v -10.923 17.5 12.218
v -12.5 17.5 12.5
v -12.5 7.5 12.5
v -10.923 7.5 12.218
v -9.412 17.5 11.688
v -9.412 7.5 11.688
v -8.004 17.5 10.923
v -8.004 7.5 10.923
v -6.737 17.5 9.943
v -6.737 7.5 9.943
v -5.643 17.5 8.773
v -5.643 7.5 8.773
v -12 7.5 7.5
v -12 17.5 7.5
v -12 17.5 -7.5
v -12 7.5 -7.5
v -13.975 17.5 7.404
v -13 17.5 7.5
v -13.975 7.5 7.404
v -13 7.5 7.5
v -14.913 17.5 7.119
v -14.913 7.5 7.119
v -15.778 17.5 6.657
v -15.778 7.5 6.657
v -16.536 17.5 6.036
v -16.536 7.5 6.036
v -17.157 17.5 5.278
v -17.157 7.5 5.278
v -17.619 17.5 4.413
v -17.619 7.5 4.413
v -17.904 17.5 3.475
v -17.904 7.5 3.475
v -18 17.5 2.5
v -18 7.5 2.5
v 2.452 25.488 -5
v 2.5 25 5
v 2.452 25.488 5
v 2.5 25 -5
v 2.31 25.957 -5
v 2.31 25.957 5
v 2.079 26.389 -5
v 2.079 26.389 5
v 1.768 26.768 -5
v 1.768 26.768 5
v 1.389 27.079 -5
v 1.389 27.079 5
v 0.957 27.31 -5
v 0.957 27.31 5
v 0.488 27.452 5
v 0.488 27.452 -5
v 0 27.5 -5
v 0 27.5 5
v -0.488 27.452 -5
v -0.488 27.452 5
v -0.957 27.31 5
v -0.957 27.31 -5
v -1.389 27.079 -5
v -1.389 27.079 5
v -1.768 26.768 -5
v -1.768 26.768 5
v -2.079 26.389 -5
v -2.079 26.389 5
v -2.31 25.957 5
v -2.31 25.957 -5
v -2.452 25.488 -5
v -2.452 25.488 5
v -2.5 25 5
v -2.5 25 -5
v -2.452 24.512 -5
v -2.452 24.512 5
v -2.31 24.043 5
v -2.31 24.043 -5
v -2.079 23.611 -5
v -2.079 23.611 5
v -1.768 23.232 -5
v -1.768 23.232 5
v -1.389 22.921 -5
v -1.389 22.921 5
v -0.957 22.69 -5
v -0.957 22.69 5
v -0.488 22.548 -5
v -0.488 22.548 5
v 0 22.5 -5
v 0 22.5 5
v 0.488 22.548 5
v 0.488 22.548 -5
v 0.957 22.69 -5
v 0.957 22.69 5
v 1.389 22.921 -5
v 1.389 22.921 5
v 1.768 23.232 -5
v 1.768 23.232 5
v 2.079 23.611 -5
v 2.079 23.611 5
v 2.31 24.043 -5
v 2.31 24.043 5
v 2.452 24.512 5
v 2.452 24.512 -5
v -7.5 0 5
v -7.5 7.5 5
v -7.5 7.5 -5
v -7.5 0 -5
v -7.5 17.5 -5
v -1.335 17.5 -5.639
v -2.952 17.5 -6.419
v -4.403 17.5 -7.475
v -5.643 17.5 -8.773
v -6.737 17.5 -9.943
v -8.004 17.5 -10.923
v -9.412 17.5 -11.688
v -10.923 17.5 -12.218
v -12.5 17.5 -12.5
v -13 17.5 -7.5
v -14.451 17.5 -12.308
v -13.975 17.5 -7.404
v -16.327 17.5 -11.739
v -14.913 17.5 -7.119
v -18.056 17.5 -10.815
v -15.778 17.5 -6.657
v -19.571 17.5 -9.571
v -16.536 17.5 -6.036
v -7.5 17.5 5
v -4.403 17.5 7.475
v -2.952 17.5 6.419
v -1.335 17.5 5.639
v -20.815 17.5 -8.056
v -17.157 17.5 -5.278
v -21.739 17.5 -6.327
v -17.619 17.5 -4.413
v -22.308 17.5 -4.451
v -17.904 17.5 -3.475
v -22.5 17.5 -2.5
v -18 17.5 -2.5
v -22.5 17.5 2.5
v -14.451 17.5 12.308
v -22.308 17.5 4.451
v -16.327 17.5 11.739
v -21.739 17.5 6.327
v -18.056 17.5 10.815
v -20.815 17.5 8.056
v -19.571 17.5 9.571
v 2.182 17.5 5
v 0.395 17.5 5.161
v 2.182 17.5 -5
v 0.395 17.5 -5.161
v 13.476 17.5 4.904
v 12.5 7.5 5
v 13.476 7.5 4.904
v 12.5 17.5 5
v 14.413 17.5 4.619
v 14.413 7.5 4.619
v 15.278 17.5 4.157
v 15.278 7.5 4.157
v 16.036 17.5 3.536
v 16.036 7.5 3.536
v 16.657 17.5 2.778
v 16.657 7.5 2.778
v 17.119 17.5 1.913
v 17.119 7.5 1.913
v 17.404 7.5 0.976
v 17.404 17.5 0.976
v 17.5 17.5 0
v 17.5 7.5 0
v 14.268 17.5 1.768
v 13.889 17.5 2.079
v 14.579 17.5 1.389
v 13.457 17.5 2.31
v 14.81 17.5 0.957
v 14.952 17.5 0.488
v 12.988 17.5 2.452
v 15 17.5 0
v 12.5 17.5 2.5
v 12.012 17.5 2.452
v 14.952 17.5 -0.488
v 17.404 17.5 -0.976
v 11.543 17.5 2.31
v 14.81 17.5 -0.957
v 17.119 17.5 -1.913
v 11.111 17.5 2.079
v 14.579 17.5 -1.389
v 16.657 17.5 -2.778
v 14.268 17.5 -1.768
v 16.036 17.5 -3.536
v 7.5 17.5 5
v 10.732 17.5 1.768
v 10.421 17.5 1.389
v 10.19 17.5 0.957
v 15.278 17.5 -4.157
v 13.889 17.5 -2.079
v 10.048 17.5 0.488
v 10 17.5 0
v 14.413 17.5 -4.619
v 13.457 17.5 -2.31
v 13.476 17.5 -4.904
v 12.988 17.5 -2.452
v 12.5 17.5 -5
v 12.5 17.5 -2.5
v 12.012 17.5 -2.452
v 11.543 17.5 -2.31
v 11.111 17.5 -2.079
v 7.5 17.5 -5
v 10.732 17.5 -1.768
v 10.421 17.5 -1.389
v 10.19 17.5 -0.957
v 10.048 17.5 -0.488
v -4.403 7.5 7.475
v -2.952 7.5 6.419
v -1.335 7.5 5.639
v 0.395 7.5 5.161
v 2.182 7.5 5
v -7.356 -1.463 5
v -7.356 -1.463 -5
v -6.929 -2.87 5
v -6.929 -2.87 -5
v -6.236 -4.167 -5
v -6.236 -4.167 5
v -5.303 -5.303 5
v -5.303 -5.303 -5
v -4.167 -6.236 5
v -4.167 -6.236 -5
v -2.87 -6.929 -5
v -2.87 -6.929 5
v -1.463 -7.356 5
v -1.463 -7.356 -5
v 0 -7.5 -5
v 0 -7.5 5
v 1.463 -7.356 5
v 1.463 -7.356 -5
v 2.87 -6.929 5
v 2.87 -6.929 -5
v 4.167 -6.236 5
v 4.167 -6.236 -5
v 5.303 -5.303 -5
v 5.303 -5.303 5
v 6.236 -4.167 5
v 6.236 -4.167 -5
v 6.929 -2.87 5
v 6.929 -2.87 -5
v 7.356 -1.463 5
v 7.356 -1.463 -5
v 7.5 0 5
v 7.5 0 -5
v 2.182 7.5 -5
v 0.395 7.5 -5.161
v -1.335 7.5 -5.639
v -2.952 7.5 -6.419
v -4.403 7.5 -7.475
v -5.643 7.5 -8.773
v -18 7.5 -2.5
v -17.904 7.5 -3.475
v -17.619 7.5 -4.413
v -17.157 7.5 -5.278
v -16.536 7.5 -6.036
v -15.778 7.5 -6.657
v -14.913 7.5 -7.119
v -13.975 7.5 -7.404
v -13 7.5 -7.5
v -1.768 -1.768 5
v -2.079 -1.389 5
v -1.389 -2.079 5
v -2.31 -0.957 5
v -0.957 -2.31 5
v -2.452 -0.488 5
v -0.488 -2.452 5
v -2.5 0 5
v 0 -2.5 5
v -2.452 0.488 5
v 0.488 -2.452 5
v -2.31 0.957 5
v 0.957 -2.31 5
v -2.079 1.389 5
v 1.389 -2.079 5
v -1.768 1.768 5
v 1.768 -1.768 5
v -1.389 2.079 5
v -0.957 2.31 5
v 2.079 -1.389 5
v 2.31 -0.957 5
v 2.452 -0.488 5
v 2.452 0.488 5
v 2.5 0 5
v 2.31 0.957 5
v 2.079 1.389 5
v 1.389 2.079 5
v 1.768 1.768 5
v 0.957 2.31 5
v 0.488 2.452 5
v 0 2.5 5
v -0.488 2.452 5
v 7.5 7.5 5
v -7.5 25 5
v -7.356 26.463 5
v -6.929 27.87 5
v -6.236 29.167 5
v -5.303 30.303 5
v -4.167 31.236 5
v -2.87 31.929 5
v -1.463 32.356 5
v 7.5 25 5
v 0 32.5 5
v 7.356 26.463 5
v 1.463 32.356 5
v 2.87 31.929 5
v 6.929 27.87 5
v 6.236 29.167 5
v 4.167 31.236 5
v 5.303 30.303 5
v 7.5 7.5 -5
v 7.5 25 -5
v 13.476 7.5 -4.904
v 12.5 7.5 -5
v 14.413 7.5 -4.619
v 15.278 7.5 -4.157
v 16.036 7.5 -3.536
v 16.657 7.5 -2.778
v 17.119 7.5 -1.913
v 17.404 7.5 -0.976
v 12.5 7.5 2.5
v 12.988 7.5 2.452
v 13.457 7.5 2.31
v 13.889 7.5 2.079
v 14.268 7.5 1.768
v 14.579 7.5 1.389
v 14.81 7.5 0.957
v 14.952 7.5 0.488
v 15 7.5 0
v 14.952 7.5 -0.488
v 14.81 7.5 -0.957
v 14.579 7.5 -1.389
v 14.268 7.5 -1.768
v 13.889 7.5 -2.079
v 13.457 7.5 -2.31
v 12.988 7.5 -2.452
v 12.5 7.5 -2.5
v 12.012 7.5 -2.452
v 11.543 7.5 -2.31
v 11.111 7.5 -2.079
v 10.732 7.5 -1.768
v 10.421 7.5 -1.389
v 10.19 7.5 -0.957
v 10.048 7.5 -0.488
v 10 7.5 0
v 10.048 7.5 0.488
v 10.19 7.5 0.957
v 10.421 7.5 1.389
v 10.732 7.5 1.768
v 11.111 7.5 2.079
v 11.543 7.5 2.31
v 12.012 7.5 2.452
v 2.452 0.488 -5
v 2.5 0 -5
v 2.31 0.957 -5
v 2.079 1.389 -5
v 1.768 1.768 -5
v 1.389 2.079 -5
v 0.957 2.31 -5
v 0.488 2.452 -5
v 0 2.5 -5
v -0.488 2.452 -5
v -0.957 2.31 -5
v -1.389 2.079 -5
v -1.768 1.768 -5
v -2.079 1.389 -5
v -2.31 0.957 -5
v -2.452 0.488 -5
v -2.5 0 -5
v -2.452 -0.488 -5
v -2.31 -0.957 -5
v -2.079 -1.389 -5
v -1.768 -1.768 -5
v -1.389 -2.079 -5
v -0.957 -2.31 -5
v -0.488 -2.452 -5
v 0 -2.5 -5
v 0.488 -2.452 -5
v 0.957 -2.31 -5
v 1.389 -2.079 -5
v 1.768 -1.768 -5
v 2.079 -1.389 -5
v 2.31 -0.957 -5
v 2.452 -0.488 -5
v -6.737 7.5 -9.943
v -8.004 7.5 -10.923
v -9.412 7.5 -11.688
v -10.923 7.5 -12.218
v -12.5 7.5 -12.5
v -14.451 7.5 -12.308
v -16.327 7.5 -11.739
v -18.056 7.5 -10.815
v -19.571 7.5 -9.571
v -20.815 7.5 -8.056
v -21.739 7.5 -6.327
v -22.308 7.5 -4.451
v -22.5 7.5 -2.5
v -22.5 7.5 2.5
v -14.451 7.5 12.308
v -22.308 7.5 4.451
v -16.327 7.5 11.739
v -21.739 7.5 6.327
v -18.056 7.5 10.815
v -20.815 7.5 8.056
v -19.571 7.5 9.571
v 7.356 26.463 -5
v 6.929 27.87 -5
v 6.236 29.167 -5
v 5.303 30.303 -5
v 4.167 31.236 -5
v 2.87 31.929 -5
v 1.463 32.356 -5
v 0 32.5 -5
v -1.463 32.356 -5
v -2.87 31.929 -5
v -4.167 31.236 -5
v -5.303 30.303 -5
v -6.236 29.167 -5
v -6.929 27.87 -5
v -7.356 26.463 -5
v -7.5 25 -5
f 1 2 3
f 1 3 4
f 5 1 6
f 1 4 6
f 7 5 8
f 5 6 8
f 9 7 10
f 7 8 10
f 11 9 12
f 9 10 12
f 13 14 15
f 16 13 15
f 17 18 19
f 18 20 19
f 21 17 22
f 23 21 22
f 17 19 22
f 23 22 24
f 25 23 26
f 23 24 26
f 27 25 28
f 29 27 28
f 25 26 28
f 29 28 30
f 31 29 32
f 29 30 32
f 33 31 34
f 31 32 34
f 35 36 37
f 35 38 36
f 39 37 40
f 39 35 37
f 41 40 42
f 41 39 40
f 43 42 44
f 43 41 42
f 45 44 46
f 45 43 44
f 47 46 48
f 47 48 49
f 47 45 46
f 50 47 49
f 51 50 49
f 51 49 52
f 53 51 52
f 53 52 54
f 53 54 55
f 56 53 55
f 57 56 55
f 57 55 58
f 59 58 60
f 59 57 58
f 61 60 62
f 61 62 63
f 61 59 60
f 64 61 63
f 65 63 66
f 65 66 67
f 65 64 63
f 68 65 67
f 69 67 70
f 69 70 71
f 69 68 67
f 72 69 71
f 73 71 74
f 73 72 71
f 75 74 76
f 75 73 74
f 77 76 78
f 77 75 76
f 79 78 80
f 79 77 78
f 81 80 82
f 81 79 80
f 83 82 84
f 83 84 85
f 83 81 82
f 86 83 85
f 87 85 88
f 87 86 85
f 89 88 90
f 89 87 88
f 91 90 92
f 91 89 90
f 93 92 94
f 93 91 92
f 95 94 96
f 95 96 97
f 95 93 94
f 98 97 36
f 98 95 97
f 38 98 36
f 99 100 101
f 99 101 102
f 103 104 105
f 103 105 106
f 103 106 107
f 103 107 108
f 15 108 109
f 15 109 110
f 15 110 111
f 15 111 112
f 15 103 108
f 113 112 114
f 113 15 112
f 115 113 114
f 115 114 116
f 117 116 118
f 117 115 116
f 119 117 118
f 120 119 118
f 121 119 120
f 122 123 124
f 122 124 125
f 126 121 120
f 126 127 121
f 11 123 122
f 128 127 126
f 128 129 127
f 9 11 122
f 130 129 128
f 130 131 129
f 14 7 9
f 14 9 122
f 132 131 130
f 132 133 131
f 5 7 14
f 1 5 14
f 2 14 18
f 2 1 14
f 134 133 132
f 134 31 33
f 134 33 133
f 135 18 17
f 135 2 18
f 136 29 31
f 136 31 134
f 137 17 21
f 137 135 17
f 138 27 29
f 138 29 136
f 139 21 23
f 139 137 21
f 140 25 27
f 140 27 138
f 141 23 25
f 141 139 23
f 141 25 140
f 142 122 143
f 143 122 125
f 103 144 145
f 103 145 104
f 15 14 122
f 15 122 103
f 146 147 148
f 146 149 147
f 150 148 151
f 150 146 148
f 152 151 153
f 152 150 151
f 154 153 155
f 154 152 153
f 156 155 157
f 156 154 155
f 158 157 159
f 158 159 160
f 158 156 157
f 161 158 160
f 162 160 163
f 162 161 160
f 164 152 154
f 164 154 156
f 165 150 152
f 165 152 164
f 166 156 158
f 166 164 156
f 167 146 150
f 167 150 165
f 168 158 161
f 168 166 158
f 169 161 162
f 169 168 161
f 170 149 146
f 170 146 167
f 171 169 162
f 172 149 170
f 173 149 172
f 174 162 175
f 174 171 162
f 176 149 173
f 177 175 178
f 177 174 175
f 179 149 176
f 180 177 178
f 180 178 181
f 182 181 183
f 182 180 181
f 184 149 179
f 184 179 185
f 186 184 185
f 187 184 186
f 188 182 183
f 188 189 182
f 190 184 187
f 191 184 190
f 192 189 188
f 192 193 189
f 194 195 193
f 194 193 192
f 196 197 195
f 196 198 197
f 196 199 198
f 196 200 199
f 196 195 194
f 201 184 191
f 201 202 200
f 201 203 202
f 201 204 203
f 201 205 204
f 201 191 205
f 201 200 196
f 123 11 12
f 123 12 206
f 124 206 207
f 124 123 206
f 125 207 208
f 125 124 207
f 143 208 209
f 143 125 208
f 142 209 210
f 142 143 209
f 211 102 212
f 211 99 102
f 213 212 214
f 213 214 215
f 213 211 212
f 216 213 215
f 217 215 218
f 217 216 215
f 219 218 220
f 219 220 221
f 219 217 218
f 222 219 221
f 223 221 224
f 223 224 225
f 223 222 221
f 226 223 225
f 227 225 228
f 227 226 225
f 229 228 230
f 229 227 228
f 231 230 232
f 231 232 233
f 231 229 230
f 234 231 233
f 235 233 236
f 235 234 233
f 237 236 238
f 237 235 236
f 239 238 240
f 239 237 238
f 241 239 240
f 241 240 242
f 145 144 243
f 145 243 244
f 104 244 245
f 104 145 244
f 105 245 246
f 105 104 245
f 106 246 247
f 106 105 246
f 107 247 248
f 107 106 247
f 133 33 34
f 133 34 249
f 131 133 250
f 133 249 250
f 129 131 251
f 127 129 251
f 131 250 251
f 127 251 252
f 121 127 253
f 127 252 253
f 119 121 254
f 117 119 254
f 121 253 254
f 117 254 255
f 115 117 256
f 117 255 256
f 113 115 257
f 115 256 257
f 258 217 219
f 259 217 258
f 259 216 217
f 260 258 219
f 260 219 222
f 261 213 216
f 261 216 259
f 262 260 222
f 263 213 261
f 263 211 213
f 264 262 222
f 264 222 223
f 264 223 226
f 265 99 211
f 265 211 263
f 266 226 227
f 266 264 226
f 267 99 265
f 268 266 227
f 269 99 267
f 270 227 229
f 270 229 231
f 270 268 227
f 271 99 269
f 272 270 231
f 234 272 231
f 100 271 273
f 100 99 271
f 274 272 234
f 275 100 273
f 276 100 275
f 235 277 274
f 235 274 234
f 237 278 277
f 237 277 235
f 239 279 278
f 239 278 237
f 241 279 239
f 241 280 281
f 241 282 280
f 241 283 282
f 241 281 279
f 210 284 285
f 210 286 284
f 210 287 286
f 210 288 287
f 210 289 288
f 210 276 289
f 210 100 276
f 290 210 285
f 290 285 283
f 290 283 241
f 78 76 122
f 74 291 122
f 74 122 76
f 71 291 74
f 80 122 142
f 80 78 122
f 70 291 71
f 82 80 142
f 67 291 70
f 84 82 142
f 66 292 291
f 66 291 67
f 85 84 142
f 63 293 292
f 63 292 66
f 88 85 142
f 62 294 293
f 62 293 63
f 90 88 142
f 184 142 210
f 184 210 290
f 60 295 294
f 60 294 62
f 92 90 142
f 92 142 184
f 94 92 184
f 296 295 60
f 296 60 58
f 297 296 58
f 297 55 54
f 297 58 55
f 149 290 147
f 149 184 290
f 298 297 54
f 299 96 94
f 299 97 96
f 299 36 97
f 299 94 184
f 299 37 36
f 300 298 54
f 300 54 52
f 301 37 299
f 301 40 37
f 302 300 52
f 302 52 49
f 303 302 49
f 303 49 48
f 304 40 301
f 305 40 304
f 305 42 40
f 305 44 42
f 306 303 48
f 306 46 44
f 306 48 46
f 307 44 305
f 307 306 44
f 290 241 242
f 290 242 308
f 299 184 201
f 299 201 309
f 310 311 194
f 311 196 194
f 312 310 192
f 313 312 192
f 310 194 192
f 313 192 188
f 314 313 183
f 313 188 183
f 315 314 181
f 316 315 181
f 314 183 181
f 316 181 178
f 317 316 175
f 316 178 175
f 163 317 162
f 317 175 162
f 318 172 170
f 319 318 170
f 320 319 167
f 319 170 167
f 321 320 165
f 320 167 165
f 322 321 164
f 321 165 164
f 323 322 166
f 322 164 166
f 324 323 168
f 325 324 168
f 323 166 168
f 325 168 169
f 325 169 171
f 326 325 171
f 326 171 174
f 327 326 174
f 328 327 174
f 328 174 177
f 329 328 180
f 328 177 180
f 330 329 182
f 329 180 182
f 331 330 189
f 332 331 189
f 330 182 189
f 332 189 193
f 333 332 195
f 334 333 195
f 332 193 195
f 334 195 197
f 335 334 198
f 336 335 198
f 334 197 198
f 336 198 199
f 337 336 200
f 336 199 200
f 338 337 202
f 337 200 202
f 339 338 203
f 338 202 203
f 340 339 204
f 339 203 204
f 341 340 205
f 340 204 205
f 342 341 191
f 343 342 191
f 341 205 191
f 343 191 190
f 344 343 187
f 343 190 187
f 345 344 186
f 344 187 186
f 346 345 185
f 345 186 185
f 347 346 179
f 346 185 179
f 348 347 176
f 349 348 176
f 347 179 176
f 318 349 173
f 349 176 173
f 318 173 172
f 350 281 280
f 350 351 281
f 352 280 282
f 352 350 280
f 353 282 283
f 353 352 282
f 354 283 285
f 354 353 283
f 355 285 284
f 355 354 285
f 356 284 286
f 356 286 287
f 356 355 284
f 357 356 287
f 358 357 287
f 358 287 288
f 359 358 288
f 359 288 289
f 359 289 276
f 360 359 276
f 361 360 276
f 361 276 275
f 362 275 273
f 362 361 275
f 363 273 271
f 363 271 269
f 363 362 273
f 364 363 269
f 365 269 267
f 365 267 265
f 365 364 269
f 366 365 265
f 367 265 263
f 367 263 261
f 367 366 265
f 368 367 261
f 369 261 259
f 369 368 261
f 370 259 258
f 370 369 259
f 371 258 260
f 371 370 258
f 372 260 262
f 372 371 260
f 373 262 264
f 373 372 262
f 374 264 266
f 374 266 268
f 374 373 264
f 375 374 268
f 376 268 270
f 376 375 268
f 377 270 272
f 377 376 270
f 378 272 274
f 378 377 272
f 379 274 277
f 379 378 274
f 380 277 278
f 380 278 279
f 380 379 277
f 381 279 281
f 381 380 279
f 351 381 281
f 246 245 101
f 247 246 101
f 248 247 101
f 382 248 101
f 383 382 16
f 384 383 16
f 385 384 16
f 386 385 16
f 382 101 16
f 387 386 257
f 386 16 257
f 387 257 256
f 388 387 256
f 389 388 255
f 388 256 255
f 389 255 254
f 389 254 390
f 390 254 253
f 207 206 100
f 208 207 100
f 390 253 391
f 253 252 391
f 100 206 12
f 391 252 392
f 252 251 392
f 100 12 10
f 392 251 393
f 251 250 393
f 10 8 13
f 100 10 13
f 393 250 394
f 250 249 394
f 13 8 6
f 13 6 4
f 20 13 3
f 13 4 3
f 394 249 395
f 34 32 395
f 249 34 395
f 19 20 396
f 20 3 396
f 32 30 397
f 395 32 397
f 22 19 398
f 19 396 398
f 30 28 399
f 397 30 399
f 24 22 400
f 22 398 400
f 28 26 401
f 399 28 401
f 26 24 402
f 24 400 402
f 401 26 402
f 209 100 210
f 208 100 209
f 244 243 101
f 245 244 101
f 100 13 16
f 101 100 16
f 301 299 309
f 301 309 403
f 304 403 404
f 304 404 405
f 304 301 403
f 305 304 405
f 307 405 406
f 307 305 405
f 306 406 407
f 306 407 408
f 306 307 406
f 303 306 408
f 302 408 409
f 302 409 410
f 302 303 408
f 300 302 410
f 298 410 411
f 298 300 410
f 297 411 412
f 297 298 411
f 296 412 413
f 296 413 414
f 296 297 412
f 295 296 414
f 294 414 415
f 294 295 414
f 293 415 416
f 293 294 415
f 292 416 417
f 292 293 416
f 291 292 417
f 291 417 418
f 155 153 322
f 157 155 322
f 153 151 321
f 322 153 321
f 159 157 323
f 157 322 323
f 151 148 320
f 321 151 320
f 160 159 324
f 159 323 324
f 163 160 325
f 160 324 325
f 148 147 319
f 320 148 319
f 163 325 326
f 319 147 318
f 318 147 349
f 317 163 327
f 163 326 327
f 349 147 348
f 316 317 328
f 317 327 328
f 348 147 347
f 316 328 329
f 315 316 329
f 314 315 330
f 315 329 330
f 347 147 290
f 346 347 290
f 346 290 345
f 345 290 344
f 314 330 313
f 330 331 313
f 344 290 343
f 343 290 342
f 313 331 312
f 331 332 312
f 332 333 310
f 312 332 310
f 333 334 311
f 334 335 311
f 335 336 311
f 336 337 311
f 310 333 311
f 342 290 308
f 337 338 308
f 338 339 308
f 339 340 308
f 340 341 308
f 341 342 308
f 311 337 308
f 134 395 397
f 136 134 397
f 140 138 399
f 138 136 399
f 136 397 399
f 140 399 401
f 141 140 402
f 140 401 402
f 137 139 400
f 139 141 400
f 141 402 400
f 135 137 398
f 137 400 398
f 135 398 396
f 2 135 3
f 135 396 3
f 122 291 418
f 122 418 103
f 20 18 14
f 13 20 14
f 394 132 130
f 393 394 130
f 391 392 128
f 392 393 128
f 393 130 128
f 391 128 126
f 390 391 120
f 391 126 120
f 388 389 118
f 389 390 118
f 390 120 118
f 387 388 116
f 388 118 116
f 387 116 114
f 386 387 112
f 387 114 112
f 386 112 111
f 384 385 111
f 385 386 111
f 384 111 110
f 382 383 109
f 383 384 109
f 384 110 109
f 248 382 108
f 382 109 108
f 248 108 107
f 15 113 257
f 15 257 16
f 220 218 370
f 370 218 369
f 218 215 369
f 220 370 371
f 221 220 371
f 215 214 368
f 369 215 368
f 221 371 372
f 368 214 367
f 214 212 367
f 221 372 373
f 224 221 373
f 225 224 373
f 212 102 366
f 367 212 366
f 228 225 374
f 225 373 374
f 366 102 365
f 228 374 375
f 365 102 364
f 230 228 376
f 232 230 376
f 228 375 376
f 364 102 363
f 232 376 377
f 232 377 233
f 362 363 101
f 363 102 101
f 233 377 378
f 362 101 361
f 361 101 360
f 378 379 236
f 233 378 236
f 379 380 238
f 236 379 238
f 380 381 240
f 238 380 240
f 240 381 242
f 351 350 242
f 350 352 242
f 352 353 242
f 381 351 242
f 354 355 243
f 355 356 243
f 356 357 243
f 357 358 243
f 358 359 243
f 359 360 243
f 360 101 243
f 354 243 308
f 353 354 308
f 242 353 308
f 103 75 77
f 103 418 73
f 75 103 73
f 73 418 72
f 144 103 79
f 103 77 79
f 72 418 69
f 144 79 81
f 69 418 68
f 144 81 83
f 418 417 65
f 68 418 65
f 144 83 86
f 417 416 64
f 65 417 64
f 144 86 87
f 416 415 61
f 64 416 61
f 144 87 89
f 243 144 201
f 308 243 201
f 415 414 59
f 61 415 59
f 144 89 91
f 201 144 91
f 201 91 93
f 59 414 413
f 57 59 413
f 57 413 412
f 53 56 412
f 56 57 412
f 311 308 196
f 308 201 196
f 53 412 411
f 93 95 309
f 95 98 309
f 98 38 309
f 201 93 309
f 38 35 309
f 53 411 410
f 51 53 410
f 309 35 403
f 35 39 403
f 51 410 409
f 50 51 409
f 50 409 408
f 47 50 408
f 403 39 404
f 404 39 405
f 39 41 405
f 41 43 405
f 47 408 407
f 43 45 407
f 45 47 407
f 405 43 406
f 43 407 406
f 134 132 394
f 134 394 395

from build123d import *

# Parameters (mm, degrees)
SKETCH1_R           = 2.5
BOSS_EXTRUDE1_DEPTH = 5
SKETCH2_W           = 25
SKETCH2_H           = 10
BOSS_EXTRUDE2_DEPTH = 15
SKETCH3_W           = 6
SKETCH3_H           = 15
CUT_EXTRUDE1_DEPTH  = 15
FILLET1_R           = 10
FILLET2_R           = 10
FILLET3_R           = 5
SKETCH4_W           = 10
SKETCH4_H           = 10
BOSS_EXTRUDE3_DEPTH = 10
FILLET4_R           = 5
SKETCH5_R           = 2.5
CUT_EXTRUDE2_DEPTH  = 10


# Some blends are built 0.0001 mm under size
with BuildPart() as part:
    # Sketch1 → Boss-Extrude1 (new, symmetric)
    with BuildSketch(Plane.XY):
        with BuildLine():
            ThreePointArc((-7.5, 0), (0, -7.5), (7.5, 0))
            Line((7.5, 0), (7.5, 25))
            ThreePointArc((7.5, 25), (0, 32.5), (-7.5, 25))
            Line((-7.5, 25), (-7.5, 0))
        make_face()
        Circle(SKETCH1_R, mode=Mode.SUBTRACT)
        with Locations((0, 25)):
            Circle(SKETCH1_R, mode=Mode.SUBTRACT)
    extrude(amount=BOSS_EXTRUDE1_DEPTH, both=True)

    # Sketch2 → Boss-Extrude2 (add)
    with BuildSketch(Plane.ZY.offset(7.5)):
        with Locations((0, 12.5)):
            Rectangle(SKETCH2_W, SKETCH2_H)
    extrude(amount=BOSS_EXTRUDE2_DEPTH)

    # Sketch3 → Cut-Extrude1 (cut)
    with BuildSketch(Plane(origin=(0, 17.5, 0), x_dir=(1, 0, 0), z_dir=(0, 1, 0))):
        with Locations((-15, 0)):
            Rectangle(SKETCH3_W, SKETCH3_H)
    extrude(amount=-CUT_EXTRUDE1_DEPTH, mode=Mode.SUBTRACT)

    # Fillet1
    # the kernel refuses this fillet: 10 mm, written as the material it adds along each edge
    with BuildSketch(Plane(origin=(-7.5, 17.5, -5), x_dir=(1, 0, 0), z_dir=(0, -1, 0))) as fillet1_piece_1:
        with BuildLine():
            CenterArc((9.682458366, -10), FILLET1_R, 90, 75.522487814)
            Line((0, -7.5), (0, 0))
            Line((0, 0), (9.682458366, 0))
        make_face()
    extrude(amount=10)
    with BuildSketch(Plane(origin=(-7.5, 17.5, 5), x_dir=(1, 0, 0), z_dir=(0, -1, 0))) as fillet1_piece_2:
        with BuildLine():
            CenterArc((9.682458366, 10), FILLET1_R, 194.477512186, 75.522487814)
            Line((0, 7.5), (0, 0))
            Line((0, 0), (9.682458366, 0))
        make_face()
    extrude(amount=10)
    # the kernel refuses this fillet: 10 mm, written as the material it takes off along each edge
    with BuildSketch(Plane(origin=(-22.5, -17.5, 12.5), x_dir=(1, 0, 0), z_dir=(0, 1, 0)), Plane(origin=(-22.5, 42.5, -12.5), x_dir=(1, 0, 0), z_dir=(0, -1, 0))) as fillet1_2_piece_1:
        with BuildLine():
            CenterArc((FILLET1_R, FILLET1_R), FILLET1_R, 180, 90)
            Line((0, FILLET1_R), (0, 0))
            Line((0, 0), (FILLET1_R, 0))
        make_face()
    extrude(amount=60, mode=Mode.SUBTRACT)

    # Fillet2
    # the kernel refuses this fillet: 10 mm, written as the material it takes off along each edge
    with BuildSketch(Plane(origin=(-7.5, 30, -12.5), x_dir=(-1.0, 0, 1.525535253676709e-12), z_dir=(0, -1, 0))) as fillet2_piece_1:
        with BuildLine():
            CenterArc((5.967480043, -9.953089087), FILLET2_R, 95.55193659, 45.937826444)
            Line((-1.857489161, -3.726544543), (-2.013988545, -3.602013652))
            ThreePointArc((-2.013988545, -3.602013652), (-0.911634188, -1.871800915), (-0.193649167, 0.05))
            Line((-0.193649167, 0.05), (0, 0.2))
            ThreePointArc((0, 0.2), (2.5, 0.2), (4.980650399, 0.199061782))
            Line((4.980650399, 0.199061782), (5, 0))
        make_face()
    extrude(amount=35, mode=Mode.SUBTRACT)
    with BuildSketch(Plane(origin=(-7.5, -5, 12.5), x_dir=(0.4461021341851978, 0, -0.8949820589684531), z_dir=(0, 1, 0))) as fillet2_piece_2:
        with BuildLine():
            CenterArc((6.245730581, 9.780881859), FILLET2_R, 212.045811166, 45.937826444)
            Line((-2.230510671, 4.474910295), (-2.400035496, 4.368790864))
            ThreePointArc((-2.400035496, 4.368790864), (-1.294251747, 2.148234721), (-0.178996412, -0.089220427))
            Line((-0.178996412, -0.089220427), (0.041638204, -0.195617637))
            ThreePointArc((0.041638204, -0.195617637), (2.081910194, 0.019118141), (4.122182183, -0.195617637))
            Line((4.122182183, -0.195617637), (4.163820387, 0))
        make_face()
    extrude(amount=35, mode=Mode.SUBTRACT)

    # Fillet3
    fillet3_edges = [part.edges().sort_by_distance(p)[0] for p in [
        (-18, 12.5, 7.5),
        (-18, 12.5, -7.5),
    ]]
    fillet(fillet3_edges, radius=FILLET3_R)

    # Sketch4 → Boss-Extrude3 (add)
    with BuildSketch(Plane(origin=(7.5, 0, 0), x_dir=(0, 0, -1), z_dir=(1, 0, 0))):
        with Locations((0, 12.5)):
            Rectangle(SKETCH4_W, SKETCH4_H)
    extrude(amount=BOSS_EXTRUDE3_DEPTH)

    # Fillet4
    fillet4_edges = [part.edges().sort_by_distance(p)[0] for p in [
        (17.5, 12.5, -5),
        (17.5, 12.5, 5),
    ]]
    fillet(fillet4_edges, radius=FILLET4_R - 0.0001)  # a hair under: the kernel refuses the full size

    # Sketch5 → Cut-Extrude2 (cut)
    with BuildSketch(Plane(origin=(0, 17.5, 0), x_dir=(1, 0, 0), z_dir=(0, 1, 0))):
        with Locations(Location((12.5, 0, 0), (0, 0, 270))):
            Circle(SKETCH5_R)
    extrude(amount=-CUT_EXTRUDE2_DEPTH, mode=Mode.SUBTRACT)


solid = part.part
